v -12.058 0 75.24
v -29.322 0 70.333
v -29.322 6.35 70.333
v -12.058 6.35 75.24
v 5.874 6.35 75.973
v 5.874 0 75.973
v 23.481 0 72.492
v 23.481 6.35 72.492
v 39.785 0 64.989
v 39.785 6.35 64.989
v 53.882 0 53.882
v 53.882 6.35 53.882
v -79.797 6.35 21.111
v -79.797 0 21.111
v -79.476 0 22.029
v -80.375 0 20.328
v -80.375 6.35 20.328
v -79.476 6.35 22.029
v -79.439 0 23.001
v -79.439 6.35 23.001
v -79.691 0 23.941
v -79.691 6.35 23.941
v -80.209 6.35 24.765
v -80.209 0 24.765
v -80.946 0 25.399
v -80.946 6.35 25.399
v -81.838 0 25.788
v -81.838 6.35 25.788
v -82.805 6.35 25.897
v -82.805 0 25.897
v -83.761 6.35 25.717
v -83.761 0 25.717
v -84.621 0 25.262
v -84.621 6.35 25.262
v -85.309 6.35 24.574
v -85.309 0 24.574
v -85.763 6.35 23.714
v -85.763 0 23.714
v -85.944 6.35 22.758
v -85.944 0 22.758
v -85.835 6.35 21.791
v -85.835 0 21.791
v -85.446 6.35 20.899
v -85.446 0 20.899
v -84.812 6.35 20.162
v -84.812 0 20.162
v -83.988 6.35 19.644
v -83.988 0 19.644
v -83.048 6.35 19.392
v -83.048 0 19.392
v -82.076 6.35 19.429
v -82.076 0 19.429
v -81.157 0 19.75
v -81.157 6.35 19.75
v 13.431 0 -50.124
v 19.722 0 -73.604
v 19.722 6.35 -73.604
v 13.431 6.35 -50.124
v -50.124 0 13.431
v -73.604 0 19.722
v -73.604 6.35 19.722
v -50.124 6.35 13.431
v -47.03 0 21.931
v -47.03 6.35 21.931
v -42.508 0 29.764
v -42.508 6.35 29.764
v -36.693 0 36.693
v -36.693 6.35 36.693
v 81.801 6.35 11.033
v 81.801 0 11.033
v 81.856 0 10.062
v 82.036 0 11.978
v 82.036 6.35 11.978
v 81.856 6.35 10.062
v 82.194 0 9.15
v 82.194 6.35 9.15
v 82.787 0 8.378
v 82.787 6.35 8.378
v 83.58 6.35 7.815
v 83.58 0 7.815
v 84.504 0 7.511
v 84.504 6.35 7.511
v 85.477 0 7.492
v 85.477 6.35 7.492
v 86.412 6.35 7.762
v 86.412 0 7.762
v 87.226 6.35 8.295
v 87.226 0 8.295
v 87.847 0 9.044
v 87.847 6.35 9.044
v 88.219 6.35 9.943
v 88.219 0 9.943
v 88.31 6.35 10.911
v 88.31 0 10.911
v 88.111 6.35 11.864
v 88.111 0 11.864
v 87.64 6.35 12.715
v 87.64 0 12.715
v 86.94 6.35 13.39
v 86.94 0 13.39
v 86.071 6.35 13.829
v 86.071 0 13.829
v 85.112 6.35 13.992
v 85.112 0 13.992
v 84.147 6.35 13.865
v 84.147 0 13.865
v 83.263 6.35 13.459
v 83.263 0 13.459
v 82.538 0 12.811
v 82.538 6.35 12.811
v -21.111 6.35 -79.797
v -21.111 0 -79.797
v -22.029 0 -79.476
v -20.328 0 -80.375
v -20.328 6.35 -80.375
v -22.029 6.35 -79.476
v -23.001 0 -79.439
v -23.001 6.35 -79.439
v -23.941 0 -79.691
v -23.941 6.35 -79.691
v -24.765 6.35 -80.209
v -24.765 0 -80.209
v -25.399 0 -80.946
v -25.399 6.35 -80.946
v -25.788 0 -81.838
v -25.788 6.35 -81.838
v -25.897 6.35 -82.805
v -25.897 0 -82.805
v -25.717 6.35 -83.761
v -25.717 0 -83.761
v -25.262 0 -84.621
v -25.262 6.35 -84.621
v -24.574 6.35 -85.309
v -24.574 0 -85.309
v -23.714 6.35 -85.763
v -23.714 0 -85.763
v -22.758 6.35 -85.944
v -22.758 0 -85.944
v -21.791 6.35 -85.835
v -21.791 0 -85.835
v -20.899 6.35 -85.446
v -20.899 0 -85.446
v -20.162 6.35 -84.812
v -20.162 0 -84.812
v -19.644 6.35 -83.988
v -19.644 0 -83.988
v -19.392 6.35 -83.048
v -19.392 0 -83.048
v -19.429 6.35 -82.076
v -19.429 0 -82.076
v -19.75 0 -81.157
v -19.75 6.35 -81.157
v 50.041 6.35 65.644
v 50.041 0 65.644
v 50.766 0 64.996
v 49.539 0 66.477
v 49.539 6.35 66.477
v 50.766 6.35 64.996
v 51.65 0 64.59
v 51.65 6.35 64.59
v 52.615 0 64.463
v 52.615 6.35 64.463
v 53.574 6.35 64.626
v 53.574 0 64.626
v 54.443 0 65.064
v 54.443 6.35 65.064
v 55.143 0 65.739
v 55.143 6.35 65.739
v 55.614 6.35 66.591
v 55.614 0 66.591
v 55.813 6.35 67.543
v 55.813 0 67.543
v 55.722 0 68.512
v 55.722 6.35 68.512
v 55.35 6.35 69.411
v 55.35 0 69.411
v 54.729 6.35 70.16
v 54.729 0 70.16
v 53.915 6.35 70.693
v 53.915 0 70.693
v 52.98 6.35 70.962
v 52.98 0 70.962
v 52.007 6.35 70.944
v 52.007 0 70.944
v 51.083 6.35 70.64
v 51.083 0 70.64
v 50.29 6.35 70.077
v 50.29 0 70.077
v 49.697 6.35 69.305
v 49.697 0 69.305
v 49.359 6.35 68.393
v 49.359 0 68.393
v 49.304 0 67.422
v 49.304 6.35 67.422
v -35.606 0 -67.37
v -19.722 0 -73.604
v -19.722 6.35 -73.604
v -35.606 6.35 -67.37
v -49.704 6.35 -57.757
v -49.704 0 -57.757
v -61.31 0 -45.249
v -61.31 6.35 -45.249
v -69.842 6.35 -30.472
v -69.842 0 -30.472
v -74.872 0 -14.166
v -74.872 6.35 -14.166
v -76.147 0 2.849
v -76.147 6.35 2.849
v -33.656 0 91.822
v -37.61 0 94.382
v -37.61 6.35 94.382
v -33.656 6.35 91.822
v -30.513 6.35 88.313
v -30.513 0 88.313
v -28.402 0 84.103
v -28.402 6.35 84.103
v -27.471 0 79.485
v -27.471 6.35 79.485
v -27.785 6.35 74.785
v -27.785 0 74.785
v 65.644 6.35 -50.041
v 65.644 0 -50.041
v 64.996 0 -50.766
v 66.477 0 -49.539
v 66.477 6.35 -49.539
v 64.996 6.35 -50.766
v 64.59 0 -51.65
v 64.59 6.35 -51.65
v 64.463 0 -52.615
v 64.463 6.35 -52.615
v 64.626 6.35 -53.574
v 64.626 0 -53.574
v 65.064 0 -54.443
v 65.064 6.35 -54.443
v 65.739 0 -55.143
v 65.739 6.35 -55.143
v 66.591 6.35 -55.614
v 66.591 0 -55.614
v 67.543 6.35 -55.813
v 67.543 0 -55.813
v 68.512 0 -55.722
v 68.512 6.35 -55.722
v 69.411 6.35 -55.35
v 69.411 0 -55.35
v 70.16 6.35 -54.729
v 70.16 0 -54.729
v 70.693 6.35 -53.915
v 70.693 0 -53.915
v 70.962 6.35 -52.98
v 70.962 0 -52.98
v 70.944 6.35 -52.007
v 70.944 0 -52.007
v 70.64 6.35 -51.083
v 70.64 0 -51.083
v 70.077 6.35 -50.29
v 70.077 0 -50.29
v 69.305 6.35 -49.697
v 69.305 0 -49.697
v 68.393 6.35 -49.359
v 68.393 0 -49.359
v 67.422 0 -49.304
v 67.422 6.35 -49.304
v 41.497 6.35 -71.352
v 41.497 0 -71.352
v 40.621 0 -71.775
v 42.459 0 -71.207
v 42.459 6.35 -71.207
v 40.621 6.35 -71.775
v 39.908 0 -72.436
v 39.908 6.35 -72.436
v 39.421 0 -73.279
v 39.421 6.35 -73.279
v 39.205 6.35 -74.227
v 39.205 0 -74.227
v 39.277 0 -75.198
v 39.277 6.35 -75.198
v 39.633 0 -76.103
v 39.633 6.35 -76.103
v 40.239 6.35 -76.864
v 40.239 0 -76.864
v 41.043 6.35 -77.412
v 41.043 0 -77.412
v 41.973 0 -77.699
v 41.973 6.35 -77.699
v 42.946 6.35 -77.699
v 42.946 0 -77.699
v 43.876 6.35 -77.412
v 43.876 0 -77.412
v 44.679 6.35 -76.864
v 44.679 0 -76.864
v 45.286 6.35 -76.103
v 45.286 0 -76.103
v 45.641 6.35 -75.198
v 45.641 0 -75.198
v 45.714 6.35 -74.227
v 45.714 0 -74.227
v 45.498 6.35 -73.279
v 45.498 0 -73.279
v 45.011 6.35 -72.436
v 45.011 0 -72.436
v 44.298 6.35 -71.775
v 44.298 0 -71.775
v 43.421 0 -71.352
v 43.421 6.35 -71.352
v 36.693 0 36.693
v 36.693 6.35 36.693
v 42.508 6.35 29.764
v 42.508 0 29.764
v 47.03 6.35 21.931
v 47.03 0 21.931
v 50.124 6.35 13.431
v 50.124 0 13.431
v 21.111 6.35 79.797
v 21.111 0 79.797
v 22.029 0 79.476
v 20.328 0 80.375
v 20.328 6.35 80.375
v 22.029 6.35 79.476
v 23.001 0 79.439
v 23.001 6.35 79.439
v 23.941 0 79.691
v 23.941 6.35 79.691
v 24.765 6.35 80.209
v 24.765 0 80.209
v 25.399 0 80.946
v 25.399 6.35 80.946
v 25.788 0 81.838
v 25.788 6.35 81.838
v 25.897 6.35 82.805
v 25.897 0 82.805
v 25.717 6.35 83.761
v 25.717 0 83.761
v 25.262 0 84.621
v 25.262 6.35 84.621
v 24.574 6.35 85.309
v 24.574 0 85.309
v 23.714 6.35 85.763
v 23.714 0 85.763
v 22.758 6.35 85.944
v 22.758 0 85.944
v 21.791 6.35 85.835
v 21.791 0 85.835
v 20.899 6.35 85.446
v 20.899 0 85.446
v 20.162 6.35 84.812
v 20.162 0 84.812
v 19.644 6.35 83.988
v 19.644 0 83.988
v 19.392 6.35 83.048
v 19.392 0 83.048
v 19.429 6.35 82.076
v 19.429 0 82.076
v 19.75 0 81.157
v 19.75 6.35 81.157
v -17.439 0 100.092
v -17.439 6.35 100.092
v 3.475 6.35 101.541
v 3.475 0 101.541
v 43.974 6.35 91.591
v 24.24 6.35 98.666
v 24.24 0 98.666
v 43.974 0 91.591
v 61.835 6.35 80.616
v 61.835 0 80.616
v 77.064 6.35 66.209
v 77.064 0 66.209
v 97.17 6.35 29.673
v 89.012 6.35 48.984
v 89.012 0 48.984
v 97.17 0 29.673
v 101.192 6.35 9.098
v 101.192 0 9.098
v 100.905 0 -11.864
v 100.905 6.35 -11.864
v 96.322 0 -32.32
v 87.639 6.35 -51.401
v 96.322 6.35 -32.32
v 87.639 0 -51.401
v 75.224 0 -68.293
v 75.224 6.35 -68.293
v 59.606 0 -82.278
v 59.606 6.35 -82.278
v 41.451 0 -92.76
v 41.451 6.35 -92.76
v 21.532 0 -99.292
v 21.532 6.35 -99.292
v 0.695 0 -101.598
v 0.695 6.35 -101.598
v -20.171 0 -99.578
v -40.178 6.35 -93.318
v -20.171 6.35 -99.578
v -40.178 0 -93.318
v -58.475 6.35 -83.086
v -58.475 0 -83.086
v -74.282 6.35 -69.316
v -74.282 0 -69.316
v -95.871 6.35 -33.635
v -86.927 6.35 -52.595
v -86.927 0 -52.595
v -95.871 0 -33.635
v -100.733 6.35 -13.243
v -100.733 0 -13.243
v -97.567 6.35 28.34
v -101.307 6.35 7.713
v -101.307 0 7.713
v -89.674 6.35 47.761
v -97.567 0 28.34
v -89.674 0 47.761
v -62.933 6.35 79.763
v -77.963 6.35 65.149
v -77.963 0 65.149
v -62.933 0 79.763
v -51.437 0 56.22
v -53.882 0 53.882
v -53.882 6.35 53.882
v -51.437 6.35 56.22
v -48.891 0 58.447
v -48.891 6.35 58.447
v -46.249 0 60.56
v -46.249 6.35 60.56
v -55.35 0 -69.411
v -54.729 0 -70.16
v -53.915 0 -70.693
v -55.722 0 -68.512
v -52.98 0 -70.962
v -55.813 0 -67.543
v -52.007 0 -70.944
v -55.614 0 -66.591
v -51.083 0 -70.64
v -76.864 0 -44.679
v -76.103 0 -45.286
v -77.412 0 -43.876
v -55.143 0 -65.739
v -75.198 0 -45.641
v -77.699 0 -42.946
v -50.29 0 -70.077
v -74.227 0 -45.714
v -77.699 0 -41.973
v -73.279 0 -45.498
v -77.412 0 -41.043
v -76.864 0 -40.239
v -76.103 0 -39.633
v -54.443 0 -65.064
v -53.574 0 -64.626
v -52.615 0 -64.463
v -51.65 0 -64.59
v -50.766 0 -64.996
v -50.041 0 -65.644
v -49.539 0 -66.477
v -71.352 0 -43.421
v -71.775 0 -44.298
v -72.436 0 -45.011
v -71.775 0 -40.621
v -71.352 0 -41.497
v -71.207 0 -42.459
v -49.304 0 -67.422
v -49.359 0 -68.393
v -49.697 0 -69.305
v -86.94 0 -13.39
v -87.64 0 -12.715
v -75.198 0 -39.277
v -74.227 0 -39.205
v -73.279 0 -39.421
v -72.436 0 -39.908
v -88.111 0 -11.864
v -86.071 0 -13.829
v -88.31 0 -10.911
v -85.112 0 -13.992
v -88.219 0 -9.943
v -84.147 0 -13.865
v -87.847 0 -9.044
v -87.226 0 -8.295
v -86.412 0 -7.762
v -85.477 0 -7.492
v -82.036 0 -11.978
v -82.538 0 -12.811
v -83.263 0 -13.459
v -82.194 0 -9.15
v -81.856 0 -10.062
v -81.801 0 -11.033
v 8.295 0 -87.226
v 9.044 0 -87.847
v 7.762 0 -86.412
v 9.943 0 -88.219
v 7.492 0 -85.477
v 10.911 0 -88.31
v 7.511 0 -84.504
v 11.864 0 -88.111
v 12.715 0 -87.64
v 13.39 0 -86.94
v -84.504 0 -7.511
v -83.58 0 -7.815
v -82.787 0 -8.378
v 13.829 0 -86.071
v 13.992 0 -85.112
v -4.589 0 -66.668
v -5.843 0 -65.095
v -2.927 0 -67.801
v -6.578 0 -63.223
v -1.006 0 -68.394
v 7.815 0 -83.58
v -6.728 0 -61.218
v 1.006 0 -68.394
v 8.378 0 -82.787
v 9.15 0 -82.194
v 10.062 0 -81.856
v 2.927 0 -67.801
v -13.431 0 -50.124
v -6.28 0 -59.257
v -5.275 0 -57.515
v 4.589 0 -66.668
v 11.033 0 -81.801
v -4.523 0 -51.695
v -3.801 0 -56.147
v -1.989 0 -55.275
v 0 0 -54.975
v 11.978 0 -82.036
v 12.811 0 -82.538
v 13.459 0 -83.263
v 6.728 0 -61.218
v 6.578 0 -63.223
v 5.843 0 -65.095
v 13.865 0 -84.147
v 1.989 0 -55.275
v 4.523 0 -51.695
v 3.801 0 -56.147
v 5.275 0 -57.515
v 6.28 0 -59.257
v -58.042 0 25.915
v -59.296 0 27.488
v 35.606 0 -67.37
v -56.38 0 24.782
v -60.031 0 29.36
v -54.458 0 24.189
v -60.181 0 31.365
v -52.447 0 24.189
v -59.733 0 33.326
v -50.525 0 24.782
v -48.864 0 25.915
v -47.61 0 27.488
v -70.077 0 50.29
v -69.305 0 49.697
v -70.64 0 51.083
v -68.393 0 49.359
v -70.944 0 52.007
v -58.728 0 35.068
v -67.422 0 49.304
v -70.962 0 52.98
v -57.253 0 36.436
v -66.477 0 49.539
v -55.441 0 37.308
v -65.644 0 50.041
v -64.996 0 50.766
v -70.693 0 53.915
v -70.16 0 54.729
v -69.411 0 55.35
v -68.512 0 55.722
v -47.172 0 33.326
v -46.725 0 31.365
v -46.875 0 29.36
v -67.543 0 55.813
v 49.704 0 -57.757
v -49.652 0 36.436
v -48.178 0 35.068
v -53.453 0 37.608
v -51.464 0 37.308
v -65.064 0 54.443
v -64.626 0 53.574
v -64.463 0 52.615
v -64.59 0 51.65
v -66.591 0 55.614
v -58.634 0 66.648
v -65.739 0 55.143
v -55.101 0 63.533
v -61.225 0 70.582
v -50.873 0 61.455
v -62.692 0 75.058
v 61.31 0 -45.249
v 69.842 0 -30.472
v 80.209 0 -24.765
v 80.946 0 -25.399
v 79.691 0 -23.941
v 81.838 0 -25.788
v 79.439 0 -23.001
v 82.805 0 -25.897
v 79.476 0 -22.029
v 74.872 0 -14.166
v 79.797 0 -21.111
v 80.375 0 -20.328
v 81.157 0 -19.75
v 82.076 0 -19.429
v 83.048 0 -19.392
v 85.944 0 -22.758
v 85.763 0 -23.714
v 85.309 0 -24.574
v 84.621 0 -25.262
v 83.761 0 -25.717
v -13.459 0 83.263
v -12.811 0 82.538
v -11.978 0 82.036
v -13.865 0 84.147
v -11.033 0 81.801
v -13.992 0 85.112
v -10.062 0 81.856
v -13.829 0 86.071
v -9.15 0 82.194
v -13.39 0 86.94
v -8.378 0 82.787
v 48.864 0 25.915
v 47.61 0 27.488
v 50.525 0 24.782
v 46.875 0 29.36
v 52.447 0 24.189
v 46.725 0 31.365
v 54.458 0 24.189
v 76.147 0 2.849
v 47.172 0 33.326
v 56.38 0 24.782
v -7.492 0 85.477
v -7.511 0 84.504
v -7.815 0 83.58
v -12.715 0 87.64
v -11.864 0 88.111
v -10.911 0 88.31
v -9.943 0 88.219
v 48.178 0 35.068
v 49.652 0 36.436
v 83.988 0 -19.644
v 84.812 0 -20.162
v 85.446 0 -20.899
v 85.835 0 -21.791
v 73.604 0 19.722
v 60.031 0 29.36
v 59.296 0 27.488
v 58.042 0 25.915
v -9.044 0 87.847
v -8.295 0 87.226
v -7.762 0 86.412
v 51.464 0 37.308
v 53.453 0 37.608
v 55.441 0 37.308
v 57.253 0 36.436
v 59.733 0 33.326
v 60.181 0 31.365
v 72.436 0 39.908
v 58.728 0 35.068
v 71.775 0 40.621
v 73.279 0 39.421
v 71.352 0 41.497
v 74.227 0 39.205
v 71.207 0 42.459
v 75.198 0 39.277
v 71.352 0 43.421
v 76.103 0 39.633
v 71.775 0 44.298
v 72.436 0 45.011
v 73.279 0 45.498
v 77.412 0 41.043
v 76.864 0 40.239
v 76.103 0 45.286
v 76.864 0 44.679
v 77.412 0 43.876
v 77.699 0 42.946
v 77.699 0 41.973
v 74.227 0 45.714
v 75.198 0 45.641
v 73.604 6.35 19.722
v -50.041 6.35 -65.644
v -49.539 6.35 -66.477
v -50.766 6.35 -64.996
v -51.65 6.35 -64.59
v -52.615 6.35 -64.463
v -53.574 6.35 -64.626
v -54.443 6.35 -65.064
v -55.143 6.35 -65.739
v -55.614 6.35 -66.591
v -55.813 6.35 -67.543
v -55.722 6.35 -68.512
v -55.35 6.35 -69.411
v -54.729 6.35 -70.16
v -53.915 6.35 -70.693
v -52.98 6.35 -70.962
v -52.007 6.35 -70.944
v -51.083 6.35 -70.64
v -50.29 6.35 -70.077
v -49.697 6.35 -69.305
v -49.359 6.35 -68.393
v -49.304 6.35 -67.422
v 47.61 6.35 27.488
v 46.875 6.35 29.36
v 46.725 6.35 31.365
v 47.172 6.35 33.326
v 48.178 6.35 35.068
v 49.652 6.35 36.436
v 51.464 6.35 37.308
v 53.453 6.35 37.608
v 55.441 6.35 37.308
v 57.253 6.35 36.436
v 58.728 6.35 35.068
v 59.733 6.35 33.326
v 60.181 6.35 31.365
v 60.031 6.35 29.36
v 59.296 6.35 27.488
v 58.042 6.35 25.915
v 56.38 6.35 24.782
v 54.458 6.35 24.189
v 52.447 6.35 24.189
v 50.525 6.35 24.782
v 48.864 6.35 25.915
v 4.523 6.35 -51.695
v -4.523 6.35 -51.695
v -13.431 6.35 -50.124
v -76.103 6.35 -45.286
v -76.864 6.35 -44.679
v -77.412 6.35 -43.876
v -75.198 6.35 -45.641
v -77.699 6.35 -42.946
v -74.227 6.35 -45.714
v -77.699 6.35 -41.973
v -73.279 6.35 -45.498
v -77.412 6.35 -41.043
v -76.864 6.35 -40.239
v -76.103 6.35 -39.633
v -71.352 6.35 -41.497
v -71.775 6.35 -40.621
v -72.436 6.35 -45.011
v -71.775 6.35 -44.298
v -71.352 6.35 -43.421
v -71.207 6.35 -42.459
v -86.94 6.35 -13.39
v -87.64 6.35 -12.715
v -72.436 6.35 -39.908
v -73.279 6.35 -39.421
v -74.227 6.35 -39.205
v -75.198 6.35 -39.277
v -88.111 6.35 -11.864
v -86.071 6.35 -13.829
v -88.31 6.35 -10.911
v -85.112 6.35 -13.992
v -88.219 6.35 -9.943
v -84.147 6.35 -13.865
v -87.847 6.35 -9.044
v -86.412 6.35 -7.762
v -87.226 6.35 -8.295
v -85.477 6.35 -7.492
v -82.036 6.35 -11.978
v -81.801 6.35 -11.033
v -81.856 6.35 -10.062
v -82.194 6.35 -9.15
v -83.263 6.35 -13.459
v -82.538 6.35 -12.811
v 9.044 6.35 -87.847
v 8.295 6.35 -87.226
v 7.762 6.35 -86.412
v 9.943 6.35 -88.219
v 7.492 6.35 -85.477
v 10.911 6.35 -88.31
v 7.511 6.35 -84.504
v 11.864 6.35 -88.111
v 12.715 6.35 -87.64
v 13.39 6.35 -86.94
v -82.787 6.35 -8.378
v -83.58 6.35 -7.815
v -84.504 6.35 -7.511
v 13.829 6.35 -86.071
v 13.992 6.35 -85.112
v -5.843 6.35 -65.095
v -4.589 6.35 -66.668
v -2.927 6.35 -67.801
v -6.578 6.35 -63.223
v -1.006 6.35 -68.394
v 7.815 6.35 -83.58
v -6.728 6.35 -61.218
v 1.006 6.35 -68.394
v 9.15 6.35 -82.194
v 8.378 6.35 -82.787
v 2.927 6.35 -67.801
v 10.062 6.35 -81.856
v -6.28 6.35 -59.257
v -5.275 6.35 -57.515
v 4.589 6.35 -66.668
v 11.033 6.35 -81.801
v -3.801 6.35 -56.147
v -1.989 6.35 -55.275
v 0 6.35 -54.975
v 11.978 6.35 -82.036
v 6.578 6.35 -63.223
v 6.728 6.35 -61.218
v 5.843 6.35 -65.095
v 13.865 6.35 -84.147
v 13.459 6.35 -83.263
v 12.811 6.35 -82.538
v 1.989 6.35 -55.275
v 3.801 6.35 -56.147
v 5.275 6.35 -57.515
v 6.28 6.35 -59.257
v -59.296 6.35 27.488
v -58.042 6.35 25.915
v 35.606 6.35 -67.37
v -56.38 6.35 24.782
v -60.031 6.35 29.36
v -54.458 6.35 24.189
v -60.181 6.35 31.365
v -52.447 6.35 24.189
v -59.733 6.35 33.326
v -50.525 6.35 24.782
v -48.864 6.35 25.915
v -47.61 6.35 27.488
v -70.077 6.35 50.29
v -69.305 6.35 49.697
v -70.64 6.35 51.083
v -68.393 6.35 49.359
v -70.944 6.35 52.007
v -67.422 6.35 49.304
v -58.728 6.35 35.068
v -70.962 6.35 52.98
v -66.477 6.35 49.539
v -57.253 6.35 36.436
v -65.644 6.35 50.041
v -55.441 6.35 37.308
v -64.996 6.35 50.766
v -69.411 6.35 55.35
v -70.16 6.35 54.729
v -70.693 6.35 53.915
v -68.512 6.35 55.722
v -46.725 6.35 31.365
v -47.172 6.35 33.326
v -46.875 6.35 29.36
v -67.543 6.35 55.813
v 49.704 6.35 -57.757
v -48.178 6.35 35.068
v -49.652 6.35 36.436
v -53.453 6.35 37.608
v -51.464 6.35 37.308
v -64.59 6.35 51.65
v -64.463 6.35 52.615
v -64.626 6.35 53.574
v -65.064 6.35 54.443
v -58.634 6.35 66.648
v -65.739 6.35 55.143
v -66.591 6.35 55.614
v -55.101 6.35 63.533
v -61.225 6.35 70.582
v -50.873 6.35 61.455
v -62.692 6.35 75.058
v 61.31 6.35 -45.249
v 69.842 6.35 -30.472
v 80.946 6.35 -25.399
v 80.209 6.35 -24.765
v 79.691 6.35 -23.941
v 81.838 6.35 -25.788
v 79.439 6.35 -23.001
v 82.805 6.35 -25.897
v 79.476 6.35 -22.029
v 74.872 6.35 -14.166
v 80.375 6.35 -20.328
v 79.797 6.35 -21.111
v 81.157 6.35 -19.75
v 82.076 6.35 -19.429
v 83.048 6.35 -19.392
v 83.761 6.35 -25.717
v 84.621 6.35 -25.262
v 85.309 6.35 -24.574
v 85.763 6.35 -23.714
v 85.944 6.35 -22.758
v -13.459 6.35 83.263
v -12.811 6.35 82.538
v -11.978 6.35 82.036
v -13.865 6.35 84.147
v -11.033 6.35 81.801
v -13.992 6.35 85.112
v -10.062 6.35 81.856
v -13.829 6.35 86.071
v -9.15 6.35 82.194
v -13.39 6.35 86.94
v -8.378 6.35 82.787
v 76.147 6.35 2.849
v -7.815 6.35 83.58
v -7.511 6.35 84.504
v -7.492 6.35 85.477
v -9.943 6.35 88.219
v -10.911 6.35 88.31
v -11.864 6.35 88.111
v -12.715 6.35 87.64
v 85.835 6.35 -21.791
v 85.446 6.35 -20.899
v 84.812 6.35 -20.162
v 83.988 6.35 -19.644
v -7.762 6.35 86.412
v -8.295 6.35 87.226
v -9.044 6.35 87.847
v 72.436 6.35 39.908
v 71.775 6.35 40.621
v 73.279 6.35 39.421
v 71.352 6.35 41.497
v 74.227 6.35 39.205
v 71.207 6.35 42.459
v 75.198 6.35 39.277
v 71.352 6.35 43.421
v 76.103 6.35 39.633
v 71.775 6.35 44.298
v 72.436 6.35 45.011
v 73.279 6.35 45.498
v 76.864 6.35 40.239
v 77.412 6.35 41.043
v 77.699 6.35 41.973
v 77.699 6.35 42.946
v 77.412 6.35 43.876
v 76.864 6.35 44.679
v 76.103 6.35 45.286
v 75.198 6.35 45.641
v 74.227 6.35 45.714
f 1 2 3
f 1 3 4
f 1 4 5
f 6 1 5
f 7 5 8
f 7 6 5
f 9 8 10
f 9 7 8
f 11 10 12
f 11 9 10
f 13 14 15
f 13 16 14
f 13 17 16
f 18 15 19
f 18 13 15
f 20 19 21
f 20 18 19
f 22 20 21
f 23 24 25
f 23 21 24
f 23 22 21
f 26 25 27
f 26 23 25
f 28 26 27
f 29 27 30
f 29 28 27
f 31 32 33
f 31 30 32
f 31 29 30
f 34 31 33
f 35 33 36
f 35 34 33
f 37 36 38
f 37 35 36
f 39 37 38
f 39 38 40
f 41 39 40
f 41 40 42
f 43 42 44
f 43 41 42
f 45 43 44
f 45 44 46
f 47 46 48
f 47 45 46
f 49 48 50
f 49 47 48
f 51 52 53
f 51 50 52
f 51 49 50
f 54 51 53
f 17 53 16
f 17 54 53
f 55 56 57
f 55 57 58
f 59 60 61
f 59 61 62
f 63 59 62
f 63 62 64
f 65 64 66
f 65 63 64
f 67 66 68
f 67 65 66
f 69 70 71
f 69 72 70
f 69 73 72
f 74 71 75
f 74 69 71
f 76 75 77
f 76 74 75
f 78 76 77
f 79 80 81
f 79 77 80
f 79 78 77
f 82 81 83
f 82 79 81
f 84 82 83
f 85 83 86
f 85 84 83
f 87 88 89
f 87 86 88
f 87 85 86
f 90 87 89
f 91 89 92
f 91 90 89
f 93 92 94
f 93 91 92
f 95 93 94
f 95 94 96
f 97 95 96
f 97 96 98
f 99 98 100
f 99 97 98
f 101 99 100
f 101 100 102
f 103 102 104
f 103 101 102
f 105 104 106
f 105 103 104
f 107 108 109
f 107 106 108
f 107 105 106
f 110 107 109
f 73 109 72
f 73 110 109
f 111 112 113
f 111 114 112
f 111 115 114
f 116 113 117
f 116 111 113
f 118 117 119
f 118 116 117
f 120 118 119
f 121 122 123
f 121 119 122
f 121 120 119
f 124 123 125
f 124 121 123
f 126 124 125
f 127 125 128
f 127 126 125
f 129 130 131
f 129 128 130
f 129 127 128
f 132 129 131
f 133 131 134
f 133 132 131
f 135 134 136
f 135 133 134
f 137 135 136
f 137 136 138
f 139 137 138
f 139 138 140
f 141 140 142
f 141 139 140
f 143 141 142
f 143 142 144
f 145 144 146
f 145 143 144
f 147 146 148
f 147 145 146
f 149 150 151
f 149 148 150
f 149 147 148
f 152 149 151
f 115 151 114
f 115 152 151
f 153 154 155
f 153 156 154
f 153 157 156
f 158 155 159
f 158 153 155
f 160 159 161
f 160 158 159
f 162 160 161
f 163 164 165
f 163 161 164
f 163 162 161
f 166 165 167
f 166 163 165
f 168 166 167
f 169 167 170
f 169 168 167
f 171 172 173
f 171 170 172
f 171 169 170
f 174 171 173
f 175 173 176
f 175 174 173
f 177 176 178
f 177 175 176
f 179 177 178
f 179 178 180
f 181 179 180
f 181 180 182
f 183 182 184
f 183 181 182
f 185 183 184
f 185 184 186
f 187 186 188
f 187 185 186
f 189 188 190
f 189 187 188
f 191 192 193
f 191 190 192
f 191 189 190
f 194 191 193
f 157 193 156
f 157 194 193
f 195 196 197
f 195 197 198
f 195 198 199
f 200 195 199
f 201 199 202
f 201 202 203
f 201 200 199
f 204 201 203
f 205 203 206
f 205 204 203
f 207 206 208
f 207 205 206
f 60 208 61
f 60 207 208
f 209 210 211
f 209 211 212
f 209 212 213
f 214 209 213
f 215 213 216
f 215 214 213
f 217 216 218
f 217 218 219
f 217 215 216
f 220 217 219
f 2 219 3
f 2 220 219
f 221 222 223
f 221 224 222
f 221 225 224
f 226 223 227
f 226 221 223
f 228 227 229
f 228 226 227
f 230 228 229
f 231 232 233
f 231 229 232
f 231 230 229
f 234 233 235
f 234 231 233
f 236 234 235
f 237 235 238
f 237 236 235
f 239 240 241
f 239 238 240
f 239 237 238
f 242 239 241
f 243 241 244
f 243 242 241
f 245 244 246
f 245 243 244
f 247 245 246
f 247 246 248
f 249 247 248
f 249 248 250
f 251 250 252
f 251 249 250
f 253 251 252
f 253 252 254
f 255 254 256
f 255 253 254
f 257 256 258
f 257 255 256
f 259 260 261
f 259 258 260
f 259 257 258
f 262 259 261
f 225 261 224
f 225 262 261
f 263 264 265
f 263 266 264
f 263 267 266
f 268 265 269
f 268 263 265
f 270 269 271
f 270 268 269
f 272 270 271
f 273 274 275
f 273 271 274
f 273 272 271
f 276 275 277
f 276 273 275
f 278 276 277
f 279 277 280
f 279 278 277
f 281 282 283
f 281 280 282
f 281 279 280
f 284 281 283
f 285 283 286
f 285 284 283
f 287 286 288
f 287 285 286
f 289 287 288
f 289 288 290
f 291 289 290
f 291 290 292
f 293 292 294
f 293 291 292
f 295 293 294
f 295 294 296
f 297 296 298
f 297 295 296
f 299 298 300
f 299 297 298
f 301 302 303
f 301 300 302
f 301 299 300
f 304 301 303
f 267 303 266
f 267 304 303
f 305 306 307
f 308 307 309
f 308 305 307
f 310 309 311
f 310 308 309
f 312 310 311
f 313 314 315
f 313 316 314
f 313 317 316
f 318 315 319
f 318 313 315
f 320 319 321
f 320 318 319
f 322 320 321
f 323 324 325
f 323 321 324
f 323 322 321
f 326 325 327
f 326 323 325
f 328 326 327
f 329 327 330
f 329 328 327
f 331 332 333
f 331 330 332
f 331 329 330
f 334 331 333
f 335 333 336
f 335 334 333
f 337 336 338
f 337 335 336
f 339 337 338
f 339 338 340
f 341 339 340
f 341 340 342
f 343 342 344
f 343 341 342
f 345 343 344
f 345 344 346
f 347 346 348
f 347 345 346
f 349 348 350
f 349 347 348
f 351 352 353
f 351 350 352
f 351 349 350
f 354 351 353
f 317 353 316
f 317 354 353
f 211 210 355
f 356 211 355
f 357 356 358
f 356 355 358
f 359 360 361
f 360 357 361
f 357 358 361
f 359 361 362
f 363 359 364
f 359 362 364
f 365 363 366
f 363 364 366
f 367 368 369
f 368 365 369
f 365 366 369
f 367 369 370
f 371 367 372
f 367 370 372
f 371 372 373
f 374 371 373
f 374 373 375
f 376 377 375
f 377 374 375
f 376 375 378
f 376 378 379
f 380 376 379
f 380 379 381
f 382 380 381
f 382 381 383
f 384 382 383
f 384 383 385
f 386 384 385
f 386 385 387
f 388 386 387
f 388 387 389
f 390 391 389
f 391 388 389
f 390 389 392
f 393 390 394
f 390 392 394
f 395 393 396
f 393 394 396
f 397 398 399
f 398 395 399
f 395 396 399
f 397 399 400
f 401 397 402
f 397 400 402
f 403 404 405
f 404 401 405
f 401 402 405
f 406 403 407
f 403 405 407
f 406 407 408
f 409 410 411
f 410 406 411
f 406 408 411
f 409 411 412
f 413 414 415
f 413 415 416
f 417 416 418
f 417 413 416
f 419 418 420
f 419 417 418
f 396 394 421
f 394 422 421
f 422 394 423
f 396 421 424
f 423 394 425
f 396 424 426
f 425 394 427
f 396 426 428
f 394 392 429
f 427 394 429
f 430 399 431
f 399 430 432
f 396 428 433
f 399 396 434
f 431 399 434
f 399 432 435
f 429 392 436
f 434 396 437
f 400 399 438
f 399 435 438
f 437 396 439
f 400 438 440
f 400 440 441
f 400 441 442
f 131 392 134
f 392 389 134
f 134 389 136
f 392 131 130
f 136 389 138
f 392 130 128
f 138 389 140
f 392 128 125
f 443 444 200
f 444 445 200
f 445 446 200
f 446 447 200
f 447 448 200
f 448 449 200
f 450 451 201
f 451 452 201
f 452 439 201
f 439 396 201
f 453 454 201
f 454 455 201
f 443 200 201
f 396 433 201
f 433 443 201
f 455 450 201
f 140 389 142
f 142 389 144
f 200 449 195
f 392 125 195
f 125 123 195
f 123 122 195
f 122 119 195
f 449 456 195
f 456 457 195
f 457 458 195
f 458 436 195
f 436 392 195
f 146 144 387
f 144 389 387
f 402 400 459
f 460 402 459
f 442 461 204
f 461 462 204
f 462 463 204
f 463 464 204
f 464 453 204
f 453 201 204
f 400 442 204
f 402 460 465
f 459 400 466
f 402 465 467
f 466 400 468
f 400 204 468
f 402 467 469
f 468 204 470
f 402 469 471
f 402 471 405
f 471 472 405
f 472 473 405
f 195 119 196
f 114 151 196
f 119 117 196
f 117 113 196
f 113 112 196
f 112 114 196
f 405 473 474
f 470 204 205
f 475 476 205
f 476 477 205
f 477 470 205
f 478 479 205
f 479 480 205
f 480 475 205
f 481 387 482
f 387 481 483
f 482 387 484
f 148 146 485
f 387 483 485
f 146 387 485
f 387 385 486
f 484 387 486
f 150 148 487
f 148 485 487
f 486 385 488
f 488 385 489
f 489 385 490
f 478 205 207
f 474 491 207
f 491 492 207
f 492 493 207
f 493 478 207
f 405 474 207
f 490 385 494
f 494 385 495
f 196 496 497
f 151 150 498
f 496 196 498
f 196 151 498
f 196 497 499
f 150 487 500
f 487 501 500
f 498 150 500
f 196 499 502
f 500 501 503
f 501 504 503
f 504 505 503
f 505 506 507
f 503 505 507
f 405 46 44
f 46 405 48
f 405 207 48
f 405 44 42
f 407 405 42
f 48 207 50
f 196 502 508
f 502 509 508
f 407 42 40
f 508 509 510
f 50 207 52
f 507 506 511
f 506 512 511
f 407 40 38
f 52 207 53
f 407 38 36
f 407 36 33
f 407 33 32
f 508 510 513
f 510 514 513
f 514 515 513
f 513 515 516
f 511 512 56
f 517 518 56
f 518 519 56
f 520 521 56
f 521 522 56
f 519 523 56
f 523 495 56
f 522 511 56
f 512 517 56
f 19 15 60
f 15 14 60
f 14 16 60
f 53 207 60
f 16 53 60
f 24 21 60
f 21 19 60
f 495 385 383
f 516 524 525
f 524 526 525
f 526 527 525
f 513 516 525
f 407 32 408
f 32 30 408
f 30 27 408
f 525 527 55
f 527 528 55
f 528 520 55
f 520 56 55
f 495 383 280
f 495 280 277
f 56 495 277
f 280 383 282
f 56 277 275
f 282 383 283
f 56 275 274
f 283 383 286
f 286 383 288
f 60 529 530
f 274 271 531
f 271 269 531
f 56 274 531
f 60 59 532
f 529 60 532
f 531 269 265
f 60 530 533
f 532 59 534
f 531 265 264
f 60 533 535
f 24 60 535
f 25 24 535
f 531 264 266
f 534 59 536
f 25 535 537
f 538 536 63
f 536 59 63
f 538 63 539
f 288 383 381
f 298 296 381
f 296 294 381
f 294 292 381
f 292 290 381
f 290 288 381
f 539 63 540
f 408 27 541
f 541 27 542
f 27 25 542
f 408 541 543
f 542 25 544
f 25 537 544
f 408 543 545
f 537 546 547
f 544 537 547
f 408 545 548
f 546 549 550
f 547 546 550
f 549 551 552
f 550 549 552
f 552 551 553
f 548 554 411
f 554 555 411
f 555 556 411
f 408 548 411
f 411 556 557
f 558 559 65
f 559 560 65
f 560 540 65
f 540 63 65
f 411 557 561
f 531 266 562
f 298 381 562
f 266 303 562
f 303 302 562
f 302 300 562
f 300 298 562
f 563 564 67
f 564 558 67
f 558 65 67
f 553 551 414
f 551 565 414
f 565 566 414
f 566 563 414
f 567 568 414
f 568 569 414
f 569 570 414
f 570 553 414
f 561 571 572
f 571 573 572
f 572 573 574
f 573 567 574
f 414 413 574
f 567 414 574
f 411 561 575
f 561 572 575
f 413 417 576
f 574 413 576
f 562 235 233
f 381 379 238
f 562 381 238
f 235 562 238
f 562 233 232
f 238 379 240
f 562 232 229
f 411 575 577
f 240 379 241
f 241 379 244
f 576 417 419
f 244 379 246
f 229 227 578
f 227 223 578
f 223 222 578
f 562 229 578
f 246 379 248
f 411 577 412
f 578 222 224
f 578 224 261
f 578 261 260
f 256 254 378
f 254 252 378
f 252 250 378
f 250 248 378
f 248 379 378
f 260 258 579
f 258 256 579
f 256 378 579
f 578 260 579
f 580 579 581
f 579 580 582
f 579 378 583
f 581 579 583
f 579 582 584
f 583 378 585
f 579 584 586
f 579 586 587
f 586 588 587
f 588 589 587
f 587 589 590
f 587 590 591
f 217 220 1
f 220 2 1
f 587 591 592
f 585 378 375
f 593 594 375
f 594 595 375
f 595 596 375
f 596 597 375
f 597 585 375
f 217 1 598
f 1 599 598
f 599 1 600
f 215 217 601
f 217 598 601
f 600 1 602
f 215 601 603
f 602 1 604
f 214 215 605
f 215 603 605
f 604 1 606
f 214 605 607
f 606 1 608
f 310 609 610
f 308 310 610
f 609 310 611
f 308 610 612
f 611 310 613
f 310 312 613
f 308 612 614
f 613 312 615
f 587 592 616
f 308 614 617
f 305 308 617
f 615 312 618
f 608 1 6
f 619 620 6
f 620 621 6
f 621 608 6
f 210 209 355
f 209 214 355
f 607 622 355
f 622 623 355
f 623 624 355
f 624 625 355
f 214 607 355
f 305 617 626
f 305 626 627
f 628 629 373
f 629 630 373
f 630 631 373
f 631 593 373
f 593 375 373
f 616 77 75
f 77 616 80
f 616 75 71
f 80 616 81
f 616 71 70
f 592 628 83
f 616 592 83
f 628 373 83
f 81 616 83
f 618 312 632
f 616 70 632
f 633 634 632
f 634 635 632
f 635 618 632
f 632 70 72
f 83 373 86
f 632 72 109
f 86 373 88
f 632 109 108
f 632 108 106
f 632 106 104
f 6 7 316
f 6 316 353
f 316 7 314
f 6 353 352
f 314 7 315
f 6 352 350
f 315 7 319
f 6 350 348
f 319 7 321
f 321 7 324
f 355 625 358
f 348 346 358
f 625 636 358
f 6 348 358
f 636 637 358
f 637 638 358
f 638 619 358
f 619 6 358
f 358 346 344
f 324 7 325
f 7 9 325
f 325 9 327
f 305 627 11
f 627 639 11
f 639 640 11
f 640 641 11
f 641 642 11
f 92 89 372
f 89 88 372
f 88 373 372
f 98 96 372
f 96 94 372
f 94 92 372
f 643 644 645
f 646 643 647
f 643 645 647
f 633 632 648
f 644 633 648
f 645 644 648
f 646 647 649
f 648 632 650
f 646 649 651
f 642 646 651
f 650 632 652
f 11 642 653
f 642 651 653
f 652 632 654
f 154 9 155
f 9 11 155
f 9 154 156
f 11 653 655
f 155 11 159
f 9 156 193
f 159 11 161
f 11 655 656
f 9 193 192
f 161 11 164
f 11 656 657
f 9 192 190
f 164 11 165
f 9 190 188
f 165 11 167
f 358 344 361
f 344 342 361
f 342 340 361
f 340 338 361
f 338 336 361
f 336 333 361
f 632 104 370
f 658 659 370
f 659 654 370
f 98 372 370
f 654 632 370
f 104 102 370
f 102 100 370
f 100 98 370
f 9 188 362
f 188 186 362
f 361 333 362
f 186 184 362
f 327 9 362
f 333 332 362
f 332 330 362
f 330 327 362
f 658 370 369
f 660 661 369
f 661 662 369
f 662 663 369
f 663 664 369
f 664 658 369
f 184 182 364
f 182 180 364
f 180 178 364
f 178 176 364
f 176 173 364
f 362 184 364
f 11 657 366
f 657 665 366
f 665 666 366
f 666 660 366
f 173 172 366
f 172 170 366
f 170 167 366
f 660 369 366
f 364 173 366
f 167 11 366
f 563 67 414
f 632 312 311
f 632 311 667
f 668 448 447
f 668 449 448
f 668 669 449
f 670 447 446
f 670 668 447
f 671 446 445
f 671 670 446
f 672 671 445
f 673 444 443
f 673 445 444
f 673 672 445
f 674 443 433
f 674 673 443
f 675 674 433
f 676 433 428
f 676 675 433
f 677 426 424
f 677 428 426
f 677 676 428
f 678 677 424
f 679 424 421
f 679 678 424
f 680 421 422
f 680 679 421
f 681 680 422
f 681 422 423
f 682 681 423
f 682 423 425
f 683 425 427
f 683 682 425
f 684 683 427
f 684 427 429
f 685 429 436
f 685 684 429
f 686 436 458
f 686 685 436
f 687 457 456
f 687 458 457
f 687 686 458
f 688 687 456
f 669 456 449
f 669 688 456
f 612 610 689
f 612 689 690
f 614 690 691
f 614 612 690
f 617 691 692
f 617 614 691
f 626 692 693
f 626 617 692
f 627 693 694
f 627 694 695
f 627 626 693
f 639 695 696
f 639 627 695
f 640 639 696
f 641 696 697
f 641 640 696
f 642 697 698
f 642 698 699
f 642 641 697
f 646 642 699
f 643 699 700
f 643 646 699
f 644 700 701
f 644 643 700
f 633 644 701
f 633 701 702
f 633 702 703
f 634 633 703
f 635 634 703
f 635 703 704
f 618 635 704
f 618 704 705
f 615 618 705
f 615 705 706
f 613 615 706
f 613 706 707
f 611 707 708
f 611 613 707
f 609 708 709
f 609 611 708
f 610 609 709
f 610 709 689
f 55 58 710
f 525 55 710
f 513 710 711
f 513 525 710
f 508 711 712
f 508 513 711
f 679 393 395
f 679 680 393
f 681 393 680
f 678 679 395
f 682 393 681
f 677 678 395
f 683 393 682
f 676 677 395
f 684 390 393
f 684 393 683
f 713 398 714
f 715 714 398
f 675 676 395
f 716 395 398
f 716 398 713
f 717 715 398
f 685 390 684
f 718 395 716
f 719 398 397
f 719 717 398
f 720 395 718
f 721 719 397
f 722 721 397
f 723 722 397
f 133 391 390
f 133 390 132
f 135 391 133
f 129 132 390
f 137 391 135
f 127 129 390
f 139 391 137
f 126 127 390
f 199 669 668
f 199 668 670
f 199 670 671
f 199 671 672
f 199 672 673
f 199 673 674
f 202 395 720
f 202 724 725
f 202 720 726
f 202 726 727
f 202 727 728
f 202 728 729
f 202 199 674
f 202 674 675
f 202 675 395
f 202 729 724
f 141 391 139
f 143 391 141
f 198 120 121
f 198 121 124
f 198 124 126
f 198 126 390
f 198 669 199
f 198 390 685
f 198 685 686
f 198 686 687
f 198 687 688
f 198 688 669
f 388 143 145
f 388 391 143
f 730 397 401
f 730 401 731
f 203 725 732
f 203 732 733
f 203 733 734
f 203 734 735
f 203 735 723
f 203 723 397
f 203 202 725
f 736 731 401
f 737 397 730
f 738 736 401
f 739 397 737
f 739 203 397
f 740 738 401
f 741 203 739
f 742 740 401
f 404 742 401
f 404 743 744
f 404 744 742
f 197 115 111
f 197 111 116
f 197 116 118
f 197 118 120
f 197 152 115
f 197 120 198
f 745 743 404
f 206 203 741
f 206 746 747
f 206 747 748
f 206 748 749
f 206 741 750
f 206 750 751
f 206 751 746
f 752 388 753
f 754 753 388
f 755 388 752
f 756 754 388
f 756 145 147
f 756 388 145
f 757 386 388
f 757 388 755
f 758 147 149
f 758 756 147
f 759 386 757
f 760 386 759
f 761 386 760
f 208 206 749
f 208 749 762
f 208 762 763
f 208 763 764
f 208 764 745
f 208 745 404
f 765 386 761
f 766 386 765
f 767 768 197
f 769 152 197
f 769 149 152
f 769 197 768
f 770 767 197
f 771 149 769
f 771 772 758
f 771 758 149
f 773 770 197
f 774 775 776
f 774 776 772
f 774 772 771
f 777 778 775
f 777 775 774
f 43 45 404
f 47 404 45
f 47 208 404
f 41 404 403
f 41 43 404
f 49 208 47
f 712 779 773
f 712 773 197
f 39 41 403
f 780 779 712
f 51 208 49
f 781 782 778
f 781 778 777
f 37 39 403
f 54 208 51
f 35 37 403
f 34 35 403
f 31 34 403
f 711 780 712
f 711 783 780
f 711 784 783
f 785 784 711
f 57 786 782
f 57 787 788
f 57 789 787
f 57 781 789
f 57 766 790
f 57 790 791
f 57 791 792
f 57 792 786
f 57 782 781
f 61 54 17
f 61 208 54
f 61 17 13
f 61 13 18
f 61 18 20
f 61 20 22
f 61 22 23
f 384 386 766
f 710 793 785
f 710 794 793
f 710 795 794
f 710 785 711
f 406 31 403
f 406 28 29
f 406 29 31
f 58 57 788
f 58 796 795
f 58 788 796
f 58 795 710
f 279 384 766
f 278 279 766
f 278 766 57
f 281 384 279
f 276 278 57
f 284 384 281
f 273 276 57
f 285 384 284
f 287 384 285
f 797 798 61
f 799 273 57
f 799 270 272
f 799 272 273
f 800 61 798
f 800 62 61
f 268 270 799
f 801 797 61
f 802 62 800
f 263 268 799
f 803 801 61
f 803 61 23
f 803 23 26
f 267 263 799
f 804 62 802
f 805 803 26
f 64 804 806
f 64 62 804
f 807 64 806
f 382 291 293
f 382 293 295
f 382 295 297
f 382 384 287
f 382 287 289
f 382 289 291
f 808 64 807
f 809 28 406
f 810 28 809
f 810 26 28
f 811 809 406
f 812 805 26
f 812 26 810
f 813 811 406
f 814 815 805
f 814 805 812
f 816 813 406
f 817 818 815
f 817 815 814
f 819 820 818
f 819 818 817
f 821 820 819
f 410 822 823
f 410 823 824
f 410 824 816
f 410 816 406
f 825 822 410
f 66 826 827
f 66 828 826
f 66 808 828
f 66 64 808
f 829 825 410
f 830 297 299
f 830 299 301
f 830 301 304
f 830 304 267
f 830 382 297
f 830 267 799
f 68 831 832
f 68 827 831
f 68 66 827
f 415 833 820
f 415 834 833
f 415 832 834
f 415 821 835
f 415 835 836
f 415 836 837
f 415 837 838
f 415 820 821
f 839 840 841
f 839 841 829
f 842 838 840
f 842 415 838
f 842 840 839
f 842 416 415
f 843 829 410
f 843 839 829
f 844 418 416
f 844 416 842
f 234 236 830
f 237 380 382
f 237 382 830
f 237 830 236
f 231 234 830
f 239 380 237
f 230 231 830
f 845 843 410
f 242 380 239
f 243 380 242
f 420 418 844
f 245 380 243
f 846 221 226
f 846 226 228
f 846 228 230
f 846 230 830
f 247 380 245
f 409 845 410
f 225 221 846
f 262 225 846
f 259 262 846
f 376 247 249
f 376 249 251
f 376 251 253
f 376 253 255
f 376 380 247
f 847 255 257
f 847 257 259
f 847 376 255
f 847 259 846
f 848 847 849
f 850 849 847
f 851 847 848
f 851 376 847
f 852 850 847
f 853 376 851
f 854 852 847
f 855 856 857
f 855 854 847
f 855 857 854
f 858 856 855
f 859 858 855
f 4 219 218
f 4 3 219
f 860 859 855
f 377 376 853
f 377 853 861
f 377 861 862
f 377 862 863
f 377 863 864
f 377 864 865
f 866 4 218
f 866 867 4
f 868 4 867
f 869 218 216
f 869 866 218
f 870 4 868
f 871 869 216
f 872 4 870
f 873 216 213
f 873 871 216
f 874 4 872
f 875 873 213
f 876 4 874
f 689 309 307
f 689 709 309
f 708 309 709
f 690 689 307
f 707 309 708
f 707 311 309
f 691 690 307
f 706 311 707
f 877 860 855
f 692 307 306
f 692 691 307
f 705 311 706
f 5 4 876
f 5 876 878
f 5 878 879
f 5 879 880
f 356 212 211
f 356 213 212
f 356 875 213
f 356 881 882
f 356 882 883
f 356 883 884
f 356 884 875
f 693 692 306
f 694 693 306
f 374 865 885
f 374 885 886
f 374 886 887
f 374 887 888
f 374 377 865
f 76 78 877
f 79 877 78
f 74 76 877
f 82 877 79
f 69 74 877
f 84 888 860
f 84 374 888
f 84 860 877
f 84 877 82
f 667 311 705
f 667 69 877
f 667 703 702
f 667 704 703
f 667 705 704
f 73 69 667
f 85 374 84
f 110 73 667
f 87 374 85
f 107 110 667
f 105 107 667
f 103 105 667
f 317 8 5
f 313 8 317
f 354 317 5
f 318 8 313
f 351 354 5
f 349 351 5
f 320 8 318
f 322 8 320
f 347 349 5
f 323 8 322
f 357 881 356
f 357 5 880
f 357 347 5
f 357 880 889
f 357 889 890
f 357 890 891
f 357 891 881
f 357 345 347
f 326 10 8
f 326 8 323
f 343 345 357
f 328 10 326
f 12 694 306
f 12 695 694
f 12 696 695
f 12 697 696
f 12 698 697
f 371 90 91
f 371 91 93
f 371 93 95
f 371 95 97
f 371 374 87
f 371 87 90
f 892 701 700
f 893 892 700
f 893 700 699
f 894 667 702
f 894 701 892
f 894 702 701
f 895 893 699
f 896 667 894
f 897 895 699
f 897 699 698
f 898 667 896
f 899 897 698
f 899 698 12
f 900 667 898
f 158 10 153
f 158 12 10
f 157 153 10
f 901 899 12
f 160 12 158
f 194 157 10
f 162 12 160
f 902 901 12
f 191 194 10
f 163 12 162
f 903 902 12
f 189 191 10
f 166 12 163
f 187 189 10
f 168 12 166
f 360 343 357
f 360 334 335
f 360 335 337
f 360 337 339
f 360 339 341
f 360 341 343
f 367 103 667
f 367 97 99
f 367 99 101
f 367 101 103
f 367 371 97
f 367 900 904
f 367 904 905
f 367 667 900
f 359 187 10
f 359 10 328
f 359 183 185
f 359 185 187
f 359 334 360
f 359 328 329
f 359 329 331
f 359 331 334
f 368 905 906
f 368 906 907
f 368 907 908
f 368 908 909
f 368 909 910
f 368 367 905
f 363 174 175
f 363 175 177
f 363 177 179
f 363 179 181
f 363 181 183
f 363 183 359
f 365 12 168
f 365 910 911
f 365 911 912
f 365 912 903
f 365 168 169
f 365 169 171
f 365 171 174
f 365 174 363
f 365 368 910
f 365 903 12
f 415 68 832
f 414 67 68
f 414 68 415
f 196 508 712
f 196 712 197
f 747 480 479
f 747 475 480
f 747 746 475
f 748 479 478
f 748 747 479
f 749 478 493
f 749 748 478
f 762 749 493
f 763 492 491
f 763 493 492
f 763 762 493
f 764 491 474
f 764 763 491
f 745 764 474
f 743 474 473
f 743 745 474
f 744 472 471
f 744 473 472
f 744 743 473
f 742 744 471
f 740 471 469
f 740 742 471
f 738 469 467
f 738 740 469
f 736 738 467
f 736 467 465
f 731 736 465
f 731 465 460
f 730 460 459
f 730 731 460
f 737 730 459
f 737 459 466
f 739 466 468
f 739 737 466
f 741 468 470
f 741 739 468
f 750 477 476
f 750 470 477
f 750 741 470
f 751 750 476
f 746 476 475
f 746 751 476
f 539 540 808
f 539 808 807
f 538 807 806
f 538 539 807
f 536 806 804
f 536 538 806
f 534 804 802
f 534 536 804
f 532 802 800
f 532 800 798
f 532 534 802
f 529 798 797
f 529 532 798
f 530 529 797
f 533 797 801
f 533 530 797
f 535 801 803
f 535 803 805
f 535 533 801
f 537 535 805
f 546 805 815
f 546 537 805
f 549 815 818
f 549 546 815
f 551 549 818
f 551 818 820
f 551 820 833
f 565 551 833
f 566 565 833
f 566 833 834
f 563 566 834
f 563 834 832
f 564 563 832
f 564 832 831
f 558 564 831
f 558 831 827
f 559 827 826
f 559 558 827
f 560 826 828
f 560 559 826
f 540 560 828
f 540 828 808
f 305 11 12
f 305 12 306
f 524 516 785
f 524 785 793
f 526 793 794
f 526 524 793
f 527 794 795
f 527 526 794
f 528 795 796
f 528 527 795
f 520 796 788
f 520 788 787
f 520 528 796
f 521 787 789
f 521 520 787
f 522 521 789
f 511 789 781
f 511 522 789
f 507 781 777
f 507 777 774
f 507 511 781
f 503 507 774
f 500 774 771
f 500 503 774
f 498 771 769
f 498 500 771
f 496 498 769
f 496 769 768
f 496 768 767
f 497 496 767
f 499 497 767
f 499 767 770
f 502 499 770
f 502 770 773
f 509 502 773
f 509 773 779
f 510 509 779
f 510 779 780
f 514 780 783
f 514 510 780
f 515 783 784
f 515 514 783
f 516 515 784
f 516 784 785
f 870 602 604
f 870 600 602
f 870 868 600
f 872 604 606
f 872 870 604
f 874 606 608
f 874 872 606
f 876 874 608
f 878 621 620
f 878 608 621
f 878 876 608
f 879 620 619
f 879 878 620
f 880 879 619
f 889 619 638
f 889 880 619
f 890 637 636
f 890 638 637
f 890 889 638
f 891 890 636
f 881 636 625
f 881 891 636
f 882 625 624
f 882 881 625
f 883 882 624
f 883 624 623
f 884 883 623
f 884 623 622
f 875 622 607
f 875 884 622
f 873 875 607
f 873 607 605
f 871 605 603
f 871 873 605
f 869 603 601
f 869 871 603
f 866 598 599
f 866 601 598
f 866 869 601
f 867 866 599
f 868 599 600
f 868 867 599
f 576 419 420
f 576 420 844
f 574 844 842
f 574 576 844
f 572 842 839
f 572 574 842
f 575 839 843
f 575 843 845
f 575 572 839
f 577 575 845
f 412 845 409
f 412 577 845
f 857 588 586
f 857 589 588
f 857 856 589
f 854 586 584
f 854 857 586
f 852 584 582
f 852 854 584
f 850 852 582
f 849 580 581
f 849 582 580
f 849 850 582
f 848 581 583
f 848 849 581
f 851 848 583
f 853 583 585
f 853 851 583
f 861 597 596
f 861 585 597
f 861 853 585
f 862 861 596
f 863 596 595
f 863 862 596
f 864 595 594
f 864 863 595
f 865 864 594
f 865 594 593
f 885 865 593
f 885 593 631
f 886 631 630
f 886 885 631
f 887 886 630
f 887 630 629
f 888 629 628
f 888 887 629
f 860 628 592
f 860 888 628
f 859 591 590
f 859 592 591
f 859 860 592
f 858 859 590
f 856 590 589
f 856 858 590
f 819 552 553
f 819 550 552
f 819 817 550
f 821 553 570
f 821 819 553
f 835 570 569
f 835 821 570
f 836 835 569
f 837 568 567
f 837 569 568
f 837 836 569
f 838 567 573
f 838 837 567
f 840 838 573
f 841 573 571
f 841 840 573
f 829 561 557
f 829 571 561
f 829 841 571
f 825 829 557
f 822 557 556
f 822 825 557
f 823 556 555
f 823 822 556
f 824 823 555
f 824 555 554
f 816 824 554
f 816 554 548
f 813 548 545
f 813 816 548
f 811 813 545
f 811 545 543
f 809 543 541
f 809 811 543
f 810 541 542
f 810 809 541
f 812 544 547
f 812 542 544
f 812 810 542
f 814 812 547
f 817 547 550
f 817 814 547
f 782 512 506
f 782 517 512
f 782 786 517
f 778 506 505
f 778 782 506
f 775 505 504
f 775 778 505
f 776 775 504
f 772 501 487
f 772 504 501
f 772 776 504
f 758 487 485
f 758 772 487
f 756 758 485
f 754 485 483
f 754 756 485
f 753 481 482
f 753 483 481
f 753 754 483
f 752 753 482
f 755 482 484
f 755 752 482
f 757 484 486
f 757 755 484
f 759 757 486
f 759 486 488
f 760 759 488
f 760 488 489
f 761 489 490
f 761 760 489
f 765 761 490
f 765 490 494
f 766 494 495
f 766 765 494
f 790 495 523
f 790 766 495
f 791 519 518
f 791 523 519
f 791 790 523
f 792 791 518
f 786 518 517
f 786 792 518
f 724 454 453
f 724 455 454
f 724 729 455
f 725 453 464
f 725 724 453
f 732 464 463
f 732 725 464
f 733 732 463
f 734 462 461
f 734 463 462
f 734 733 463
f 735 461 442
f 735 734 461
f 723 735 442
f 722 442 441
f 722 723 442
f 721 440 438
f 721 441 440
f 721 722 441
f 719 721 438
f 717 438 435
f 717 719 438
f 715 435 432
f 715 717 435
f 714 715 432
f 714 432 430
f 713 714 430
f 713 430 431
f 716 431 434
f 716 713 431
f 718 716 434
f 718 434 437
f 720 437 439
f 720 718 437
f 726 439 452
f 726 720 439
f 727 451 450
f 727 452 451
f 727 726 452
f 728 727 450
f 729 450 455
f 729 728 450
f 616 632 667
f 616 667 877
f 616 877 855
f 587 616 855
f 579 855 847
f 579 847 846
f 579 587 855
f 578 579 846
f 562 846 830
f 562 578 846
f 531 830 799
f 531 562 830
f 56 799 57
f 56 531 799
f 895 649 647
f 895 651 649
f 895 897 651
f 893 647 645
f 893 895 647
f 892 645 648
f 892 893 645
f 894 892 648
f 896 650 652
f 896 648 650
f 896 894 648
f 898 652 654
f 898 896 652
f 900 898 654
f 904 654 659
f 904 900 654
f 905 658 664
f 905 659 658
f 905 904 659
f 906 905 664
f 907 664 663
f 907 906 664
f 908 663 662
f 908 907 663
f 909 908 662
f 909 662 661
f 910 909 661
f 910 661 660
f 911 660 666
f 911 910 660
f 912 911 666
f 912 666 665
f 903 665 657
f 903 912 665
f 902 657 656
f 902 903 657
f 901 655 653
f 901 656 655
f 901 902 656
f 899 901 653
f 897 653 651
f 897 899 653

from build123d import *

# Parameters (mm, degrees)
SKETCH1_R          = 101.6
EXTRUDE1_DEPTH     = 6.35
SKETCH3_R          = 51.8922
CUT_EXTRUDE2_DEPTH = 6.35
SKETCH5_R          = 6.746875
CUT_EXTRUDE4_DEPTH = 6.35
CIRPATTERN1_COUNT  = 3
SKETCH16_R         = 17.78
CUT_EXTRUDE5_DEPTH = 6.35
CUT_EXTRUDE9_DEPTH = 6.35
CIRPATTERN2_COUNT  = 3
CIRPATTERN3_COUNT  = 16


with BuildPart() as part:
    # Sketch1 → Extrude1 (new body)
    with BuildSketch(Plane(origin=(0, 0, 0), x_dir=(1, 0, 0), z_dir=(0, 1, 0))):
        with Locations(Location((0, 0, 0), (0, 0, 270))):
            Circle(SKETCH1_R)
    extrude(amount=EXTRUDE1_DEPTH)

    # Sketch3 → Cut-Extrude2 (cut)
    with BuildSketch(Plane(origin=(0, 0, 0), x_dir=(1, 0, 0), z_dir=(0, 1, 0))):
        with Locations(Location((0, 0, 0), (0, 0, 270))):
            Circle(SKETCH3_R)
    extrude(amount=CUT_EXTRUDE2_DEPTH, mode=Mode.SUBTRACT)

    # Sketch5 → Cut-Extrude4 (cut)
    with BuildSketch(Plane(origin=(0, 0, 0), x_dir=(1, 0, 0), z_dir=(0, 1, 0))):
        with Locations(Location((0, 61.722, 0), (0, 0, 270))):
            Circle(SKETCH5_R)
    cut_extrude4 = extrude(amount=CUT_EXTRUDE4_DEPTH, mode=Mode.SUBTRACT)

    # CirPattern1: Cut-Extrude4 ×3 about axis
    cirpattern1_axis = Axis((0, 0, 0), (0, 1, 0))
    for i in range(1, CIRPATTERN1_COUNT):
        add(cut_extrude4.rotate(cirpattern1_axis, i * 360 / CIRPATTERN1_COUNT), mode=Mode.SUBTRACT)

    # Sketch16 → Cut-Extrude5 (cut)
    with BuildSketch(Plane(origin=(0, 0, 0), x_dir=(1, 0, 0), z_dir=(0, 1, 0))):
        with Locations((-45.212, -78.309481112)):
            Circle(SKETCH16_R)
    extrude(amount=CUT_EXTRUDE5_DEPTH, mode=Mode.SUBTRACT)

    # Sketch17 → Cut-Extrude9 (cut)
    with BuildSketch(Plane(origin=(0, 0, 0), x_dir=(1, 0, 0), z_dir=(0, 1, 0))):
        with BuildLine():
            Line((-13.430689652, 50.124016163), (-19.722011237, 73.603547963))
            ThreePointArc((-19.722011237, 73.603547963), (-65.991135768, 38.1), (-73.603547963, -19.722011237))
            Line((-73.603547963, -19.722011237), (-50.124016163, -13.430689652))
            ThreePointArc((-50.124016163, -13.430689652), (-44.939963458, 25.9461), (-13.430689652, 50.124016163))
        make_face()
    cut_extrude9 = extrude(amount=CUT_EXTRUDE9_DEPTH, mode=Mode.SUBTRACT)

    # CirPattern2: Cut-Extrude9 ×3 about axis
    cirpattern2_axis = Axis((0, 0, 0), (0, 1, 0))
    for i in range(1, CIRPATTERN2_COUNT):
        add(cut_extrude9.rotate(cirpattern2_axis, i * 360 / CIRPATTERN2_COUNT), mode=Mode.SUBTRACT)

    # Sketch23 → F (0.257) Diameter Hole1 (revolve, cut)
    with BuildSketch(Plane(origin=(42.459430359, 6.35, -74.471285732), x_dir=(0, 0, 1), z_dir=(1, 0, 0))):
        Polygon((0, 0), (0, 60.381148974), (3.2639, 58.42), (3.2639, 0), align=None)
    f_0_257_diameter_hole1 = revolve(axis=Axis((42.459430359, 12.7, -74.471285732), (0, -1, 0)), mode=Mode.SUBTRACT)

    # CirPattern3: F (0.257) Diameter Hole1 ×16 about axis, 1 skipped
    cirpattern3_axis = Axis((0, 0, 0), (0, 1, 0))
    add([f_0_257_diameter_hole1.rotate(cirpattern3_axis, i * 360 / CIRPATTERN3_COUNT) for i in range(1, CIRPATTERN3_COUNT) if i not in (8,)], mode=Mode.SUBTRACT)


solid = part.part
